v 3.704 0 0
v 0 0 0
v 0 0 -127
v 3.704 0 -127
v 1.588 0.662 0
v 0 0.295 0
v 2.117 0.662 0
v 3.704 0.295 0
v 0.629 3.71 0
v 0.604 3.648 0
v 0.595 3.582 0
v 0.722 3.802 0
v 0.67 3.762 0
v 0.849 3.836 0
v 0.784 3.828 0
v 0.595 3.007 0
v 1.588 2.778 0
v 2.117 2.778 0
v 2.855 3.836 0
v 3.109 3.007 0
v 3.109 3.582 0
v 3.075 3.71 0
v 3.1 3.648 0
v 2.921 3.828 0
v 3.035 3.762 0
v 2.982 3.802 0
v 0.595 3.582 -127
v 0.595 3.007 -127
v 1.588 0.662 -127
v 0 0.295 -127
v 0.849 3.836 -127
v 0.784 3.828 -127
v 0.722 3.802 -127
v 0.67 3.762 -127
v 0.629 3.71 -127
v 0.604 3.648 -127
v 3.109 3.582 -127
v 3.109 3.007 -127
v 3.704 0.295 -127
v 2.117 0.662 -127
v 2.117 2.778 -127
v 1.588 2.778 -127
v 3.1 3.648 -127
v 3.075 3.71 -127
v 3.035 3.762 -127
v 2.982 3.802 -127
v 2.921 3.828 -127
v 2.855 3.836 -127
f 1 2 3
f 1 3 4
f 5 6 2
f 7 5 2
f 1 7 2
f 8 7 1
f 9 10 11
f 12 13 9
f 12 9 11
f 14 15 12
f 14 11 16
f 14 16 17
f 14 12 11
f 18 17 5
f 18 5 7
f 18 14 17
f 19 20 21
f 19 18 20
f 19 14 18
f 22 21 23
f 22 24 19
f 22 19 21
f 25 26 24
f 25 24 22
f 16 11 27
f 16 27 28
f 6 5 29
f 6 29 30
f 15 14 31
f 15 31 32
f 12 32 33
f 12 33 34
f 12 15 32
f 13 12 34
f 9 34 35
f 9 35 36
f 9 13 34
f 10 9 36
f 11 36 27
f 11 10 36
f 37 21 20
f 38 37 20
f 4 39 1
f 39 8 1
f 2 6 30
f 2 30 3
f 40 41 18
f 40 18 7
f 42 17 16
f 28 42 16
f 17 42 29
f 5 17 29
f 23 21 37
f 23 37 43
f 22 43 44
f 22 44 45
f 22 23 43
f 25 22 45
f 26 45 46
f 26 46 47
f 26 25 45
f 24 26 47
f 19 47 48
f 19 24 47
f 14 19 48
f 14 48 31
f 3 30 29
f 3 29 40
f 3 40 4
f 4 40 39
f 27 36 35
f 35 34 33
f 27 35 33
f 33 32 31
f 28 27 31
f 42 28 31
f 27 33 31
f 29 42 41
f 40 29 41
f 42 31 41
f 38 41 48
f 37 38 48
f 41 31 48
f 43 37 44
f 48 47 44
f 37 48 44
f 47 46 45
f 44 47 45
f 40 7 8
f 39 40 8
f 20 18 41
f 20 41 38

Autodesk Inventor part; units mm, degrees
ref_plane "YZ Plane" through (0, 0, 0) normal (1, 0, 0) x (0, 1, 0)
ref_plane "XZ Plane" through (0, 0, 0) normal (0, 1, 0) x (-1, 0, 0)
ref_plane "XY Plane" through (0, 0, 0) normal (0, 0, 1) x (1, 0, 0)
sketch "Sketch1" plane through (0, 0, 0) normal (0, 0, 1) x (1, 0, 0)
  line L0 (0, 0) -> (3.7042, 0)
  line L1 (1.8521, 0) -> (1.8521, 0.6615)
  line L2 (1.8521, 0.6615) -> (2.1167, 0.6615)
  line L3 (2.1167, 0.6615) -> (3.7042, 0.295)
  line L4 (3.7042, 0.295) -> (3.7042, 0)
  line L5 (1.8521, 0.6615) -> (1.8521, 2.7781)
  line L6 (1.8521, 2.7781) -> (2.1167, 2.7781)
  line L7 (2.1167, 2.7781) -> (2.1167, 0.6615)
  line L8 (1.8521, 2.7781) -> (1.8521, 3.8365)
  line L9 (1.8521, 3.8365) -> (2.8549, 3.8365)
  line L10 (2.1167, 2.7781) -> (3.1089, 3.0072)
  line L11 (2.1167, 2.7781) -> (3.135, 2.7781) construction
  line L12 (3.1089, 3.5825) -> (3.1089, 3.0072)
  arc A0 (3.1089, 3.5825) -> (2.8549, 3.8365) centre (2.8549, 3.5825) ccw
  line L13 (3.7042, 0) -> (0, 0)
  line L14 (1.8521, 0.6615) -> (1.5875, 0.6615)
  line L15 (1.5875, 0.6615) -> (0, 0.295)
  line L16 (0, 0.295) -> (0, 0)
  line L17 (1.8521, 2.7781) -> (1.5875, 2.7781)
  line L18 (1.5875, 2.7781) -> (1.5875, 0.6615)
  line L19 (1.8521, 3.8365) -> (0.8493, 3.8365)
  line L20 (1.5875, 2.7781) -> (0.5953, 3.0072)
  line L21 (1.5875, 2.7781) -> (0.5692, 2.7781) construction
  line L22 (0.5953, 3.5825) -> (0.5953, 3.0072)
  arc A1 (0.8493, 3.8365) -> (0.5953, 3.5825) centre (0.8493, 3.5825) ccw
  dimension "d3" = 0.6615
  dimension "d4" = 0.2646
  dimension "d5" = 167
  dimension "d6" = 2.1167
  dimension "d7" = 1.0583
  dimension "d9" = 13
  dimension "d10" = 0.254
extrude "Extrusion1" add sketch "Sketch1" against normal blind 127
properties part number "Rail48in"
